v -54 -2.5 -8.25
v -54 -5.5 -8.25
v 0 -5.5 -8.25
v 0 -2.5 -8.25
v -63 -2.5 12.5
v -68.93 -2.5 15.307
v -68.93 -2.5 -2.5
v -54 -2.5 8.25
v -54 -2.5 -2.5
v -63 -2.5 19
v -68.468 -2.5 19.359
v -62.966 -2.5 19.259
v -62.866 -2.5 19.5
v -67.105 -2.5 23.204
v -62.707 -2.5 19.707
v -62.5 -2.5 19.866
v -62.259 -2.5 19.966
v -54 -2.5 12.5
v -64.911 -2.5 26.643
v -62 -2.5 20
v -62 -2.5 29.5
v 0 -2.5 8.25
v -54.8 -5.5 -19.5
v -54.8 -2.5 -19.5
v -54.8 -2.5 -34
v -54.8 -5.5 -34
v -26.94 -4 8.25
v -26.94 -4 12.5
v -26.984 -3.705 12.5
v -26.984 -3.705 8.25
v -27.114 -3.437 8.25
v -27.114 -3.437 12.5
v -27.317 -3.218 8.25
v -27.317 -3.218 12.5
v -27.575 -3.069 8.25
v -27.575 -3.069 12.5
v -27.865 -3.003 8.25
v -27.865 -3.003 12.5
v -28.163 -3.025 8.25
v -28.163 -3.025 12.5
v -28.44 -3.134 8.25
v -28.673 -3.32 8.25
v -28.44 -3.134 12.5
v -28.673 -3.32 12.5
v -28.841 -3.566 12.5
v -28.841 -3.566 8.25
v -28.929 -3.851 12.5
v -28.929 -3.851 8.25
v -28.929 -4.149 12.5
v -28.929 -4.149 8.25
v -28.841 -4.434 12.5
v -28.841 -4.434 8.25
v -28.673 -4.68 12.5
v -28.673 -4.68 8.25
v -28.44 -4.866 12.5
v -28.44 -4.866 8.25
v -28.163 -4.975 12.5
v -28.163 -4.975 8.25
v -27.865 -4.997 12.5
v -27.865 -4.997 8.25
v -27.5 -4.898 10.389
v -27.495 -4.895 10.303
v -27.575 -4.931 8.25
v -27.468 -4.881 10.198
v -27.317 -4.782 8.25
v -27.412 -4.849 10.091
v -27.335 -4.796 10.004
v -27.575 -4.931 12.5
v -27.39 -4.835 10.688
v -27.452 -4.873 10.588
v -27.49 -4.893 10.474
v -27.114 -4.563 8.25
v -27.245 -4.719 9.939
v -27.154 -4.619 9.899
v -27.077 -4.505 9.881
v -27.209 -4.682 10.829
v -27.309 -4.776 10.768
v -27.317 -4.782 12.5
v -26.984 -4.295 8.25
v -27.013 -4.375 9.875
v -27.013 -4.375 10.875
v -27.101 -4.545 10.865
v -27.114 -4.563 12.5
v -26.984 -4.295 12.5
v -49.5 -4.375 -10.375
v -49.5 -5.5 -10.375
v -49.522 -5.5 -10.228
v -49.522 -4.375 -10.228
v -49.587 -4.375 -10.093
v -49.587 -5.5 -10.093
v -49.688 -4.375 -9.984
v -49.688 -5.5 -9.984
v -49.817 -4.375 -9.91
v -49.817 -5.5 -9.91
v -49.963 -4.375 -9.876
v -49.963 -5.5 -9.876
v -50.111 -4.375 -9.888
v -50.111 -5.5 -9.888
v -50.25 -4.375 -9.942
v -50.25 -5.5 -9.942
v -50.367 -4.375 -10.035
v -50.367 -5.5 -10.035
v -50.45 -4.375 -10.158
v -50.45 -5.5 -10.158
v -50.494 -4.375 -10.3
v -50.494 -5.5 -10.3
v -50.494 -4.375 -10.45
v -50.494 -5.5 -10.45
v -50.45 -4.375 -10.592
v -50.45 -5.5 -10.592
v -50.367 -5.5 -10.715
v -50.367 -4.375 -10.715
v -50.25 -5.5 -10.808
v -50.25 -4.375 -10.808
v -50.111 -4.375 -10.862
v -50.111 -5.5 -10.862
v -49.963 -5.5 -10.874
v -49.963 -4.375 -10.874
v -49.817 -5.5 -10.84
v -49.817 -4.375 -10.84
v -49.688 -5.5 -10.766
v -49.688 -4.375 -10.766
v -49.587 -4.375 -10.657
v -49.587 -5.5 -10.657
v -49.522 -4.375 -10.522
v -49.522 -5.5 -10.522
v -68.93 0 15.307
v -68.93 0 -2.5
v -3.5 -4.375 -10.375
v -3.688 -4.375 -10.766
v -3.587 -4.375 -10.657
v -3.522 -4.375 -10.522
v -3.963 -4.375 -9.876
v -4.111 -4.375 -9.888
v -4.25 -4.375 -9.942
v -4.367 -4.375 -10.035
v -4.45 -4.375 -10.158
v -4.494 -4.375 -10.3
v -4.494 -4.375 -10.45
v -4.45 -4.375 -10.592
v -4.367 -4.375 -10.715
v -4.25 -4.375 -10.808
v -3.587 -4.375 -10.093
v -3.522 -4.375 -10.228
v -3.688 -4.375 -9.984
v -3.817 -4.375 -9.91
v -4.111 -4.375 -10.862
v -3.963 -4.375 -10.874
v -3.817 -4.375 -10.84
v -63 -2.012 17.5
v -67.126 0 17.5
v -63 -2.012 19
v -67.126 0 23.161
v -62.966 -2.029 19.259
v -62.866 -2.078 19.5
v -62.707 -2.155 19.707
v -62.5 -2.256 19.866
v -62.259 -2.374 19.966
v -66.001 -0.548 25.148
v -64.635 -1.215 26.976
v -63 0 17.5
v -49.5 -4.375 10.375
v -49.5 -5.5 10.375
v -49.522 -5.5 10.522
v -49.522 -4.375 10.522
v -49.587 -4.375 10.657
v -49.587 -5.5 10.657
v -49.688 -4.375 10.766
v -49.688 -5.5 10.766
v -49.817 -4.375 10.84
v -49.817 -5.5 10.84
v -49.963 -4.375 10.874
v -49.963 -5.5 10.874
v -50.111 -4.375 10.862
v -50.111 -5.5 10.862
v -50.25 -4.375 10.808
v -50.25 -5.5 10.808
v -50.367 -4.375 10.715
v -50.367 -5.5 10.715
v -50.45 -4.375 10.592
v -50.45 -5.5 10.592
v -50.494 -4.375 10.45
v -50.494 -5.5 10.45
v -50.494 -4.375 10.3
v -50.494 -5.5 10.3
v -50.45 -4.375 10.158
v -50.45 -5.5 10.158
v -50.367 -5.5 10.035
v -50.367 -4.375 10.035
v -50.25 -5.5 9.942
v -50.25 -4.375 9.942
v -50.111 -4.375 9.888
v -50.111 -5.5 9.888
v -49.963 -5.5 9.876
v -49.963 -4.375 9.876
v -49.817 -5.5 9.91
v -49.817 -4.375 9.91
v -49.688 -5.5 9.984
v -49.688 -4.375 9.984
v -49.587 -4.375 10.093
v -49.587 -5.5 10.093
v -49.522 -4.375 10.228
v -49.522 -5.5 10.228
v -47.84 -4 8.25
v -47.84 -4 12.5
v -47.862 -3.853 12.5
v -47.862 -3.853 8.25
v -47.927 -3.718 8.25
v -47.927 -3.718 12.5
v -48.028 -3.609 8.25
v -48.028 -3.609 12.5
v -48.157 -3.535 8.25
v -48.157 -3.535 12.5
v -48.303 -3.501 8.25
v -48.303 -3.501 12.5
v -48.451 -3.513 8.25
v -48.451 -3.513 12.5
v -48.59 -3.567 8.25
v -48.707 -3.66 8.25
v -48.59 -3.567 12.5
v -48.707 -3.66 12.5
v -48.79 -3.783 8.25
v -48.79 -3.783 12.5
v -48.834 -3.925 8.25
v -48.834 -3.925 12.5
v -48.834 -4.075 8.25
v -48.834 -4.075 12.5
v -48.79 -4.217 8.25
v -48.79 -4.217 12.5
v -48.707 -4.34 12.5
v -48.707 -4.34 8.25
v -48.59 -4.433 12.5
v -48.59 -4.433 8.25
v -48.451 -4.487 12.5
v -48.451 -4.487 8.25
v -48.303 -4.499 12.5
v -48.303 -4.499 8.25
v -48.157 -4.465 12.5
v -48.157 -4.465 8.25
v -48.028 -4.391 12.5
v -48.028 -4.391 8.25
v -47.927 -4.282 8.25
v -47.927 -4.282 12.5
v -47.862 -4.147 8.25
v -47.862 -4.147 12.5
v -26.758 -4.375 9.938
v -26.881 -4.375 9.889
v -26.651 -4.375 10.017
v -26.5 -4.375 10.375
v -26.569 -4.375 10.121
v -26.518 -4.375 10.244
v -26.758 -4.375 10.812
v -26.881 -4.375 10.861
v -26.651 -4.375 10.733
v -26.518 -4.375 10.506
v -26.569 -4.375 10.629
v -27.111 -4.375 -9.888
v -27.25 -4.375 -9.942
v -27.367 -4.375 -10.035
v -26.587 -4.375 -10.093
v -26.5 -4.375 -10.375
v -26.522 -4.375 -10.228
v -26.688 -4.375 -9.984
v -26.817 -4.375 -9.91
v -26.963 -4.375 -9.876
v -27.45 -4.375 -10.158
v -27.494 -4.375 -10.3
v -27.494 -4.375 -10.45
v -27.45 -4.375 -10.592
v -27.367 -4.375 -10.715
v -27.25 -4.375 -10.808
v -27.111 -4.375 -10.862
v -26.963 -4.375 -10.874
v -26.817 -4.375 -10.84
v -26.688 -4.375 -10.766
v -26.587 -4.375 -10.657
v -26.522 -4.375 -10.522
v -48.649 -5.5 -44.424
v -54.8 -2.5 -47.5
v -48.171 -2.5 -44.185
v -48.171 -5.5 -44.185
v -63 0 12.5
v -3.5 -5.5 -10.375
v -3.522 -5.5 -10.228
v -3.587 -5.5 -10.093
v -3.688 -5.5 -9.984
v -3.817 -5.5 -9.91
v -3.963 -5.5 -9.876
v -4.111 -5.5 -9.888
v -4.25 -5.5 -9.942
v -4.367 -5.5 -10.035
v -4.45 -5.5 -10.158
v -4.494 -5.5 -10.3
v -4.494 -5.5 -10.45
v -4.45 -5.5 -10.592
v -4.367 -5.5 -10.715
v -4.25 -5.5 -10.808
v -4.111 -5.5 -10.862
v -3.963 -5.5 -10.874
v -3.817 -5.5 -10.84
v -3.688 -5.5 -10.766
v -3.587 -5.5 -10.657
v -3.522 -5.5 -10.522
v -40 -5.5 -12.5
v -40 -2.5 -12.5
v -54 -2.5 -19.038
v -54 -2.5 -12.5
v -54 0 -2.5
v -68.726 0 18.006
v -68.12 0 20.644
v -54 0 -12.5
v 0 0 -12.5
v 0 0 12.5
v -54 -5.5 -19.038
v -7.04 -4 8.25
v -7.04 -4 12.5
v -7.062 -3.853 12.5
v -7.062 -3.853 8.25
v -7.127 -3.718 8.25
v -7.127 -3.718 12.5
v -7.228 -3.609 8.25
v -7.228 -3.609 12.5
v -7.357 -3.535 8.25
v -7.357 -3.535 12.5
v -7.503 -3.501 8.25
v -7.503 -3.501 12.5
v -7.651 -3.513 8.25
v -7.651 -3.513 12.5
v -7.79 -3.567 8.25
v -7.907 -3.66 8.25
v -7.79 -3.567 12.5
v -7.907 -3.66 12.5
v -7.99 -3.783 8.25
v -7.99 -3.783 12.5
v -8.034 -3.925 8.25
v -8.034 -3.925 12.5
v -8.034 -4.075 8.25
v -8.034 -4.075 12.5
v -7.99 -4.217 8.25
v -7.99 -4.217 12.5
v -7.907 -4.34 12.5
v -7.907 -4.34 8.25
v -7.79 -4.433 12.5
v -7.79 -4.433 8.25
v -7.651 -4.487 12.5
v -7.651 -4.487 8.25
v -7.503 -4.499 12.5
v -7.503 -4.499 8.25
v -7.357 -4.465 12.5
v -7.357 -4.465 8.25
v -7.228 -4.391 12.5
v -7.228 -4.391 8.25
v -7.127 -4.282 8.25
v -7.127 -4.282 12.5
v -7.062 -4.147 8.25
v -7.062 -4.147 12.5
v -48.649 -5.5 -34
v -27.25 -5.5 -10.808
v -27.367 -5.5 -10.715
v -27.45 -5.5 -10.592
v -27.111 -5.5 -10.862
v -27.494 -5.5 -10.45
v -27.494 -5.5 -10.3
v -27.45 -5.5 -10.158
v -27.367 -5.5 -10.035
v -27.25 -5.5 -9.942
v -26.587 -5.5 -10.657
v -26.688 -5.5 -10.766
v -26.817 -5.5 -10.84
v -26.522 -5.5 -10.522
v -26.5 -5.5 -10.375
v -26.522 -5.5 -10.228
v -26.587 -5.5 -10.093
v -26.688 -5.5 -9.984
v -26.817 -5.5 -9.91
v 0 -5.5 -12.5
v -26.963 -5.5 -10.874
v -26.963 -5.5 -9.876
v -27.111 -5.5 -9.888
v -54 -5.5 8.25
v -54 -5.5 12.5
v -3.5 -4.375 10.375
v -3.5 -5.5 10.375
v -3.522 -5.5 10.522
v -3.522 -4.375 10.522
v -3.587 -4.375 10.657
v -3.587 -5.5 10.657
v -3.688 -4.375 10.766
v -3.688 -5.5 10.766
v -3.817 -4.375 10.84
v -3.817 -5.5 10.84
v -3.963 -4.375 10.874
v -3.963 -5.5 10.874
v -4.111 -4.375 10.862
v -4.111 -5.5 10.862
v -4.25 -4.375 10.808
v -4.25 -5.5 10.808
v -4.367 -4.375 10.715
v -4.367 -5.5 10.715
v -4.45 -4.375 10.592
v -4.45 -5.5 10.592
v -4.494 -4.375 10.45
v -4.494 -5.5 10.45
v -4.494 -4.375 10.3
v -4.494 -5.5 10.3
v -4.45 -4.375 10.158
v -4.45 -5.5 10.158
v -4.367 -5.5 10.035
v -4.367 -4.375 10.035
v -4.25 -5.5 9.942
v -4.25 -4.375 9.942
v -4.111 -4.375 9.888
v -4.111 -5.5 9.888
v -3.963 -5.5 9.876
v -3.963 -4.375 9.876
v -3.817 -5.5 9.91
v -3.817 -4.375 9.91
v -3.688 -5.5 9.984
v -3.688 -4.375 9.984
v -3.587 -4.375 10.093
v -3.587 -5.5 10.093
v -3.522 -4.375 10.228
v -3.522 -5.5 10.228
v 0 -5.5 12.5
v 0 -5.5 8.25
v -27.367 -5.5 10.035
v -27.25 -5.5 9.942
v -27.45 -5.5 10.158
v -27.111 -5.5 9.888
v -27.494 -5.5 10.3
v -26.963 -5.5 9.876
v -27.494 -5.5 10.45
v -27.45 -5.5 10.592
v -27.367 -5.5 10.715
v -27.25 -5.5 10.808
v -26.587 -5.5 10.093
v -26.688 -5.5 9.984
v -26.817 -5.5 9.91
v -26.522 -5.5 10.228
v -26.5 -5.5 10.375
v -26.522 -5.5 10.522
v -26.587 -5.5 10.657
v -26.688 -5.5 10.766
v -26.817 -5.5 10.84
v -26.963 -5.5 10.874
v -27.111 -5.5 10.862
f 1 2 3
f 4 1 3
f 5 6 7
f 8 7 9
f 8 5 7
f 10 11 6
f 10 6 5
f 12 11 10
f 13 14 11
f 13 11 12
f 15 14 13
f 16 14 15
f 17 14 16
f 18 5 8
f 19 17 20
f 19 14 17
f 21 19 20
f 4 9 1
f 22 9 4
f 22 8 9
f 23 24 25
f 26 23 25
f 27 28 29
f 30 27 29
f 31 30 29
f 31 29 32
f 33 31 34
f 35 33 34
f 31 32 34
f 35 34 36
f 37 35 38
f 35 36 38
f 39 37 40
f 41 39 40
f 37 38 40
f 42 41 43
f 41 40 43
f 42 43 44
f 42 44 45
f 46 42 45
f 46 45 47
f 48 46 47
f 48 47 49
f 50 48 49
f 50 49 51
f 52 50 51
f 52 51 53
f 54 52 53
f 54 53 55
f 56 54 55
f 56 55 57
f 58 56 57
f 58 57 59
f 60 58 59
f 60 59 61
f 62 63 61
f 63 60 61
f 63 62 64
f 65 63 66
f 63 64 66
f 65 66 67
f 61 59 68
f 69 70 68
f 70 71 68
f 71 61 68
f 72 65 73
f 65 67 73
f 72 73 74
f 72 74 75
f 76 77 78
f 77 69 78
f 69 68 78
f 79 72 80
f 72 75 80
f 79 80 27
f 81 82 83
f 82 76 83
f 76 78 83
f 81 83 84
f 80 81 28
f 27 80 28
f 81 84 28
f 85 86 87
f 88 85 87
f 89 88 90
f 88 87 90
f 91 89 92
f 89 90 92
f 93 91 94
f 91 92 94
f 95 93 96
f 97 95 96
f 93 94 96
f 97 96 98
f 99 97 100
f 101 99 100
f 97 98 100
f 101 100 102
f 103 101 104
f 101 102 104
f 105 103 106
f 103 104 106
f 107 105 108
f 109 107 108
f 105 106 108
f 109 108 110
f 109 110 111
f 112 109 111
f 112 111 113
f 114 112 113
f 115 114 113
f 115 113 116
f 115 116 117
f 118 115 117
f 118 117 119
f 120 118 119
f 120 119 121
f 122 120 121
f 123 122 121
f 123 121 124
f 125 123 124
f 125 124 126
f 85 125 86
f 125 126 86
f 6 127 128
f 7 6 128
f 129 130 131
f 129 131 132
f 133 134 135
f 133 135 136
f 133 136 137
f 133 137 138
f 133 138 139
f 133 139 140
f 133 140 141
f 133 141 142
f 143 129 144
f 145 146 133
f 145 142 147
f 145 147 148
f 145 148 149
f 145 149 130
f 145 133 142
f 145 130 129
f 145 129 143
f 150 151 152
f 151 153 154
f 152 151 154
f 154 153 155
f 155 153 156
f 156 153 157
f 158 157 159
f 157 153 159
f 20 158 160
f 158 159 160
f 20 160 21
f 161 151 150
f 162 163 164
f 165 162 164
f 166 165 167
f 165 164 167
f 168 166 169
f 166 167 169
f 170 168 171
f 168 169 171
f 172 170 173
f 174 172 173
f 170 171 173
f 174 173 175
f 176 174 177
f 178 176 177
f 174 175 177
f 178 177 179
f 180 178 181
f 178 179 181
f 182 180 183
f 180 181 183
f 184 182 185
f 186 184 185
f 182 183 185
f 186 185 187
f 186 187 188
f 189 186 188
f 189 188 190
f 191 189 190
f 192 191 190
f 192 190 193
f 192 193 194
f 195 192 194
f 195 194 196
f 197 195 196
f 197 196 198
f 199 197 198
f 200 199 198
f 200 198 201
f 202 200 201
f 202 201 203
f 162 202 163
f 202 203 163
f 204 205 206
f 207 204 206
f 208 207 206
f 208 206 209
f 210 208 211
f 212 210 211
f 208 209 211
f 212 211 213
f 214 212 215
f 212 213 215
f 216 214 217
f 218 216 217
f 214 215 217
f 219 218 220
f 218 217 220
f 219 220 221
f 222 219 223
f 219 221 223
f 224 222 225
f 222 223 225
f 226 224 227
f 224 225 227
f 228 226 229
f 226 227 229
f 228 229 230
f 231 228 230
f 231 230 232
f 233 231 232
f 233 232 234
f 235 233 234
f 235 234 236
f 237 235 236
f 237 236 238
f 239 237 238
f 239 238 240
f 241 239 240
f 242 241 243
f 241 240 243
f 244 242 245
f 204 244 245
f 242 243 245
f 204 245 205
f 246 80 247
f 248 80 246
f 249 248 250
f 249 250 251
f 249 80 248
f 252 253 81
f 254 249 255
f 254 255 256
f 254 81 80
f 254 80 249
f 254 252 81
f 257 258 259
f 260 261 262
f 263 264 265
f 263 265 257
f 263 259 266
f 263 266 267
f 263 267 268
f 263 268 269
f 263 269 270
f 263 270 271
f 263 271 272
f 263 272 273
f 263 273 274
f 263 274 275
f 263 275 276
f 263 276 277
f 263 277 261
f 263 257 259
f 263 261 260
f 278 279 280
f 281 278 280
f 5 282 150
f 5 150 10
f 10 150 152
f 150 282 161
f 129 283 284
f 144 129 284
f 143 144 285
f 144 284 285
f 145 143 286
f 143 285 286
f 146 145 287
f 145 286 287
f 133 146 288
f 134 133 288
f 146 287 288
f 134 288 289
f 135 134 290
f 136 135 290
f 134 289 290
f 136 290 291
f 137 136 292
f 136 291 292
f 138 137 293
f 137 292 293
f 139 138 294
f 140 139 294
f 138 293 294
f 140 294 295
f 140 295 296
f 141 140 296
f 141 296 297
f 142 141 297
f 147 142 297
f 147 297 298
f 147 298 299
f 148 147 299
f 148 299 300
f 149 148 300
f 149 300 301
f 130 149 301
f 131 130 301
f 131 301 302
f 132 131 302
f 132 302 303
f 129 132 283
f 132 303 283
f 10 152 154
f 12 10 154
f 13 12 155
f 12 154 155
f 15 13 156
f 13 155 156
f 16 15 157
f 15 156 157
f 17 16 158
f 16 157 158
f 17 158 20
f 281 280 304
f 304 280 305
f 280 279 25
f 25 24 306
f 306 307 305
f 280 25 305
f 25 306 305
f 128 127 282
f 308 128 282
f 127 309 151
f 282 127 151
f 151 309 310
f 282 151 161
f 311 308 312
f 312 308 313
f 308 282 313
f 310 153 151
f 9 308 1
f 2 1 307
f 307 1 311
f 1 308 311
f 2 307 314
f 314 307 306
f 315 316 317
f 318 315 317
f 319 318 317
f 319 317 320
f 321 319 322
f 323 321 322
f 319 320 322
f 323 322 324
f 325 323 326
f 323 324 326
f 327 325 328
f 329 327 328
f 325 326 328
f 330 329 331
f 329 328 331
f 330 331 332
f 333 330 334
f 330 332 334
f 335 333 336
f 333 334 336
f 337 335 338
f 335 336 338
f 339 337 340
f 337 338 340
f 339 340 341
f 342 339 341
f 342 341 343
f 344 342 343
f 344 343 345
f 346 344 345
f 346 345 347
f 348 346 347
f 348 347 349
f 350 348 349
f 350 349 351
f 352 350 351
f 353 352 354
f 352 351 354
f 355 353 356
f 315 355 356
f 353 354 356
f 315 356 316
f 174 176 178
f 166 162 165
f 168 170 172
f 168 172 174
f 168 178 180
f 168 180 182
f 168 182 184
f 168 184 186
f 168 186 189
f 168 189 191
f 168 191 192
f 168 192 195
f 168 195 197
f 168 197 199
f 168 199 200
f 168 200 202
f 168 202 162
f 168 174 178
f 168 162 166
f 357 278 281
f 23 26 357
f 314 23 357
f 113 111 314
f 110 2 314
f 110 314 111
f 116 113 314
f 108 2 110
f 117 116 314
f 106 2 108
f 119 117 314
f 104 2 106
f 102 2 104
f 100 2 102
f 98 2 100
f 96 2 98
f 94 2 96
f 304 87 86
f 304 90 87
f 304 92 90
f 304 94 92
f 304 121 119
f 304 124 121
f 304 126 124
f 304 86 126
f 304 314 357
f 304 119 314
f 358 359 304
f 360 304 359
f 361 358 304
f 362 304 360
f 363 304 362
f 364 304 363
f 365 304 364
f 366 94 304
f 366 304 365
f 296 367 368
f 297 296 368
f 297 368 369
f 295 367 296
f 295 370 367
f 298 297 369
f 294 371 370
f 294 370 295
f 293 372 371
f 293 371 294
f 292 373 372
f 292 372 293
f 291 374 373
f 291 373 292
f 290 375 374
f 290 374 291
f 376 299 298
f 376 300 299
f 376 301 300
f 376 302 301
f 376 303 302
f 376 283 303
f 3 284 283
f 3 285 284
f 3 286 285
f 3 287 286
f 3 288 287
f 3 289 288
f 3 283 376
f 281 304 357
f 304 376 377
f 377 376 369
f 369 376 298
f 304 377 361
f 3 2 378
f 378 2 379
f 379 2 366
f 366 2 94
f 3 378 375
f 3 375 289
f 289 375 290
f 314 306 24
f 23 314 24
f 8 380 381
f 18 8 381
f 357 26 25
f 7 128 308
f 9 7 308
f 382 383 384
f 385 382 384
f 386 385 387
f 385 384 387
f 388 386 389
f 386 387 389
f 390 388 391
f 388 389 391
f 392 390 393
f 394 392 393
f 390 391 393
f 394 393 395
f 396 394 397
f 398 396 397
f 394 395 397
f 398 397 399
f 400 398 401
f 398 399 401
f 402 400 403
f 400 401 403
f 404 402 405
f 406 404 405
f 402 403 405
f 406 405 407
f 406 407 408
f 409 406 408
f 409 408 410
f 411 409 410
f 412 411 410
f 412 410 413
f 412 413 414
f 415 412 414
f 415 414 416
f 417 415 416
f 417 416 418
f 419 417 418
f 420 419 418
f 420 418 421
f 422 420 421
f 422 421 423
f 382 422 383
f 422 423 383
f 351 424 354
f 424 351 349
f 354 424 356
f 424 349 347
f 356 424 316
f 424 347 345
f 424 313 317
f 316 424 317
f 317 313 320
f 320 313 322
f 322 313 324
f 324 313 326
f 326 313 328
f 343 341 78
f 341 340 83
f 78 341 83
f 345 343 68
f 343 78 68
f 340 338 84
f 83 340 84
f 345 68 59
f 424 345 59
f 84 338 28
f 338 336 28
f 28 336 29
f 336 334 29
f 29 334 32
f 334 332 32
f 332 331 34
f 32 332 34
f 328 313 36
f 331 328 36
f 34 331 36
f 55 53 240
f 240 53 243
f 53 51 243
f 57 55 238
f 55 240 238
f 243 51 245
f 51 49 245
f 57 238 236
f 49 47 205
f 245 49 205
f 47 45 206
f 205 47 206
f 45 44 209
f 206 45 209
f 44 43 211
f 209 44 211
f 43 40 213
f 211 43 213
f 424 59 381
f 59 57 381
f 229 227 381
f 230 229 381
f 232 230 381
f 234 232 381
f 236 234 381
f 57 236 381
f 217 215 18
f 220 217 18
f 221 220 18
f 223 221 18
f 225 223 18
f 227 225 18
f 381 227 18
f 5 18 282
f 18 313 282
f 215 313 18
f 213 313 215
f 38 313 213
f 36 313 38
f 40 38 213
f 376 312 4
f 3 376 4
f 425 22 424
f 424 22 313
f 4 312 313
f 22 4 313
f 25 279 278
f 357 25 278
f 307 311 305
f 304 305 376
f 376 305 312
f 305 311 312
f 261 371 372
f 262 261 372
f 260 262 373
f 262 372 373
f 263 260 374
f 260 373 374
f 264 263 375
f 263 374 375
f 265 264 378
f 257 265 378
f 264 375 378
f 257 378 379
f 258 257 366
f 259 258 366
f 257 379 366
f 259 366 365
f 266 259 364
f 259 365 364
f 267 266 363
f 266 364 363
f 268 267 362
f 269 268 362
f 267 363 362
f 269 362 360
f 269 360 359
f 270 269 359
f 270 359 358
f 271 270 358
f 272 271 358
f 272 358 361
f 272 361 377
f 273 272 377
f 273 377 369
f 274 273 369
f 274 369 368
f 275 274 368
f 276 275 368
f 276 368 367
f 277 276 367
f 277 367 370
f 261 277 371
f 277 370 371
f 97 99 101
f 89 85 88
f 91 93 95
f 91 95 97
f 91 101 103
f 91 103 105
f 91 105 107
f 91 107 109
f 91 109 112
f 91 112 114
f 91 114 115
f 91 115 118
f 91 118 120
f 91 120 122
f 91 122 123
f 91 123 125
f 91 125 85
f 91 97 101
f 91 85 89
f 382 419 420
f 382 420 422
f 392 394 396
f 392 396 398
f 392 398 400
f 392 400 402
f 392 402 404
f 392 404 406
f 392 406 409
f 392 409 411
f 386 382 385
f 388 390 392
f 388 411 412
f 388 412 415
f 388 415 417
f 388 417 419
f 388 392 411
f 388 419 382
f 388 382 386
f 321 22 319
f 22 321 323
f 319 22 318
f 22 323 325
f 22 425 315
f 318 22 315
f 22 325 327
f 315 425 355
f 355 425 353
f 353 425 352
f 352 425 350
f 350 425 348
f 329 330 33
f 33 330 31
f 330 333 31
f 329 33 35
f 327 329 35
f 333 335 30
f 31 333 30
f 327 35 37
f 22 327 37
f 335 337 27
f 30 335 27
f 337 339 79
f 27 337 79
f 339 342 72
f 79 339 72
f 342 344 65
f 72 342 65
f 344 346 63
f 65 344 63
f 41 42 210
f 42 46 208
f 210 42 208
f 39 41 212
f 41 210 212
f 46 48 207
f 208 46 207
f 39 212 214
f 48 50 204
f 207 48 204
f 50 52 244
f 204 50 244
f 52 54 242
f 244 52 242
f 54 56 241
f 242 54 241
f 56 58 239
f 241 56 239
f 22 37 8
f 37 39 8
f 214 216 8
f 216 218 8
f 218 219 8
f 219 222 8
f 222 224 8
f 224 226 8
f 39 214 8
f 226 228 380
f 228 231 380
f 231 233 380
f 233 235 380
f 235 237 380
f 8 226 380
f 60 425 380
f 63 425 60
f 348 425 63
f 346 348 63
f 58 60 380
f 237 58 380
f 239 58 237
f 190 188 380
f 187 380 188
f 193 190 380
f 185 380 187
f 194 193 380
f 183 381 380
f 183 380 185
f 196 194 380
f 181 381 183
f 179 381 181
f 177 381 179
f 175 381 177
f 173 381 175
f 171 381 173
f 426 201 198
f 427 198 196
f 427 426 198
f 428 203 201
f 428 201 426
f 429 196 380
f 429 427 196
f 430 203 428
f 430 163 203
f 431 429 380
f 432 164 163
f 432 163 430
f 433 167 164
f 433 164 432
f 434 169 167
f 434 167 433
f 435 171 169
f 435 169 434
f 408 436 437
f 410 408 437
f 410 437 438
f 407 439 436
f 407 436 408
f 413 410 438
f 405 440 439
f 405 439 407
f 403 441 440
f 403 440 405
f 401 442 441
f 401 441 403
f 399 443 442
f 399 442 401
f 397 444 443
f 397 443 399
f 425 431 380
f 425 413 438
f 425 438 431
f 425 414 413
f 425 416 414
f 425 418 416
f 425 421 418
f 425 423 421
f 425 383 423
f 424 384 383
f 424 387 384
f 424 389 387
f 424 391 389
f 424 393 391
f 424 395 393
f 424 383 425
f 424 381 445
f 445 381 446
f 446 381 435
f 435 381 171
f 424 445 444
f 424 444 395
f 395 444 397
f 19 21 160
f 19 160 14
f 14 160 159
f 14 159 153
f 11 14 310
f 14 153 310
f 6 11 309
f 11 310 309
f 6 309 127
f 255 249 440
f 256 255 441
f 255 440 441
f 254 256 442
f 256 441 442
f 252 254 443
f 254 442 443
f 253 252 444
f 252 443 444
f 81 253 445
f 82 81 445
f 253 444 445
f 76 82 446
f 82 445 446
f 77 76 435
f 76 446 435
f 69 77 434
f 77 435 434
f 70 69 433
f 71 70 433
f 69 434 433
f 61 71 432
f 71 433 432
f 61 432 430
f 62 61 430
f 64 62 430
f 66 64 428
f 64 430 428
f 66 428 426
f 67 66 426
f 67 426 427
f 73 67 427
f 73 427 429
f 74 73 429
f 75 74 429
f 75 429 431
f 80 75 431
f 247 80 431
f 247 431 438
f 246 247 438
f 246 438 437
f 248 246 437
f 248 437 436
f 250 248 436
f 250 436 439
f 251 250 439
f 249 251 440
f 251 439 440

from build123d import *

# Parameters (mm, degrees)
F1_DEPTH  = 5.5
F3_DEPTH  = 3
F4_R      = 0.5
F5_DEPTH  = 1.125
F9_DEPTH  = 12.5
F10_W     = 14.8
F10_H     = 2.5
F11_DEPTH = 47
F13_DEPTH = 13.5
F14_R     = 0.5
F15_DEPTH = 4.25
F16_R     = 1
F17_DEPTH = 4.25


with BuildPart() as f1:
    # F0 (on Front) → F1 (new body)
    with BuildSketch(Plane.XZ):
        with BuildLine():
            Line((0, -12.5), (0, 12.5))
            Line((0, 12.5), (-63, 12.5))
            Line((-63, 12.5), (-63, 19))
            ThreePointArc((-63, 19), (-62.7071067812, 19.7071067812), (-62, 20))
            Line((-62, 20), (-62, 29.5))
            ThreePointArc((-62, 29.5), (-67.1049806801, 23.2039800052), (-68.93, 15.3065120566))
            Line((-68.93, 15.3065120566), (-68.93, -2.5))
            Line((-68.93, -2.5), (-54, -2.5))
            Line((-54, -2.5), (-54, -19.0381197846))
            Line((-54, -19.0381197846), (-54.8, -19.5))
            Line((-54.8, -19.5), (-54.8, -47.5))
            Line((-54.8, -47.5), (-48.1705947427, -44.1845815863))
            Line((-48.1705947427, -44.1845815863), (-40, -12.5))
            Line((-40, -12.5), (0, -12.5))
        make_face()
    extrude(amount=F1_DEPTH)

    # F2 (on face) → F3 (cut)
    with BuildSketch(Plane.XZ.offset(5.5)):
        Polygon((0, -8.25), (0, 8.25), (-54, 8.25), (-54, 31.9336503744), (-73.7788975239, 31.9336503744), (-73.7788975239, -2.5), (-54, -2.5), (-54, -8.25), align=None)
    extrude(amount=-F3_DEPTH, mode=Mode.SUBTRACT)

    # F4 (on face) → F5 (cut)
    with BuildSketch(Plane.XZ.offset(5.5)):
        with Locations((-4, 10.375)):
            Circle(F4_R)
        with Locations((-27, 10.375)):
            Circle(F4_R)
        with Locations((-50, 10.375)):
            Circle(F4_R)
        with Locations((-50, -10.375)):
            Circle(F4_R)
        with Locations((-27, -10.375)):
            Circle(F4_R)
        with Locations((-4, -10.375)):
            Circle(F4_R)
    extrude(amount=-F5_DEPTH, mode=Mode.SUBTRACT)

    # F8 (on offset) → F9 (cut)
    with BuildSketch(Plane.XY.offset(30)):
        Polygon((-67.1257596039, 0), (-62, -2.5), (-62, 0), align=None)
    extrude(amount=-F9_DEPTH, mode=Mode.SUBTRACT)

    # F10 (on face) → F11 (cut)
    with BuildSketch(Plane(origin=(0, 0, -12.5), x_dir=(1, 0, 0), z_dir=(0, 0, -1))):
        with Locations((-47.4, 1.25)):
            Rectangle(F10_W, F10_H)
    extrude(amount=F11_DEPTH, mode=Mode.SUBTRACT)

    # F12 (on plane+point) → F13 (cut)
    with BuildSketch(Plane(origin=(0, 0, -47.5), x_dir=(1, 0, 0), z_dir=(0, 0, -1))):
        Polygon((-48.6490884753, 5.5), (-54.8, 5.5), (-54.8, 2.5), align=None)
    extrude(amount=-F13_DEPTH, mode=Mode.SUBTRACT)

    # F14 (on face) → F15 (cut, through all)
    with BuildSketch(Plane.XY.offset(12.5)):
        with Locations((-7.54, -4)):
            Circle(F14_R)
        with Locations((-48.34, -4)):
            Circle(F14_R)
    extrude(amount=-F15_DEPTH, mode=Mode.SUBTRACT)

    # F16 (on face) → F17 (cut, through all)
    with BuildSketch(Plane.XY.offset(12.5)):
        with Locations((-27.94, -4)):
            Circle(F16_R)
    extrude(amount=-F17_DEPTH, mode=Mode.SUBTRACT)


solid = f1.part
